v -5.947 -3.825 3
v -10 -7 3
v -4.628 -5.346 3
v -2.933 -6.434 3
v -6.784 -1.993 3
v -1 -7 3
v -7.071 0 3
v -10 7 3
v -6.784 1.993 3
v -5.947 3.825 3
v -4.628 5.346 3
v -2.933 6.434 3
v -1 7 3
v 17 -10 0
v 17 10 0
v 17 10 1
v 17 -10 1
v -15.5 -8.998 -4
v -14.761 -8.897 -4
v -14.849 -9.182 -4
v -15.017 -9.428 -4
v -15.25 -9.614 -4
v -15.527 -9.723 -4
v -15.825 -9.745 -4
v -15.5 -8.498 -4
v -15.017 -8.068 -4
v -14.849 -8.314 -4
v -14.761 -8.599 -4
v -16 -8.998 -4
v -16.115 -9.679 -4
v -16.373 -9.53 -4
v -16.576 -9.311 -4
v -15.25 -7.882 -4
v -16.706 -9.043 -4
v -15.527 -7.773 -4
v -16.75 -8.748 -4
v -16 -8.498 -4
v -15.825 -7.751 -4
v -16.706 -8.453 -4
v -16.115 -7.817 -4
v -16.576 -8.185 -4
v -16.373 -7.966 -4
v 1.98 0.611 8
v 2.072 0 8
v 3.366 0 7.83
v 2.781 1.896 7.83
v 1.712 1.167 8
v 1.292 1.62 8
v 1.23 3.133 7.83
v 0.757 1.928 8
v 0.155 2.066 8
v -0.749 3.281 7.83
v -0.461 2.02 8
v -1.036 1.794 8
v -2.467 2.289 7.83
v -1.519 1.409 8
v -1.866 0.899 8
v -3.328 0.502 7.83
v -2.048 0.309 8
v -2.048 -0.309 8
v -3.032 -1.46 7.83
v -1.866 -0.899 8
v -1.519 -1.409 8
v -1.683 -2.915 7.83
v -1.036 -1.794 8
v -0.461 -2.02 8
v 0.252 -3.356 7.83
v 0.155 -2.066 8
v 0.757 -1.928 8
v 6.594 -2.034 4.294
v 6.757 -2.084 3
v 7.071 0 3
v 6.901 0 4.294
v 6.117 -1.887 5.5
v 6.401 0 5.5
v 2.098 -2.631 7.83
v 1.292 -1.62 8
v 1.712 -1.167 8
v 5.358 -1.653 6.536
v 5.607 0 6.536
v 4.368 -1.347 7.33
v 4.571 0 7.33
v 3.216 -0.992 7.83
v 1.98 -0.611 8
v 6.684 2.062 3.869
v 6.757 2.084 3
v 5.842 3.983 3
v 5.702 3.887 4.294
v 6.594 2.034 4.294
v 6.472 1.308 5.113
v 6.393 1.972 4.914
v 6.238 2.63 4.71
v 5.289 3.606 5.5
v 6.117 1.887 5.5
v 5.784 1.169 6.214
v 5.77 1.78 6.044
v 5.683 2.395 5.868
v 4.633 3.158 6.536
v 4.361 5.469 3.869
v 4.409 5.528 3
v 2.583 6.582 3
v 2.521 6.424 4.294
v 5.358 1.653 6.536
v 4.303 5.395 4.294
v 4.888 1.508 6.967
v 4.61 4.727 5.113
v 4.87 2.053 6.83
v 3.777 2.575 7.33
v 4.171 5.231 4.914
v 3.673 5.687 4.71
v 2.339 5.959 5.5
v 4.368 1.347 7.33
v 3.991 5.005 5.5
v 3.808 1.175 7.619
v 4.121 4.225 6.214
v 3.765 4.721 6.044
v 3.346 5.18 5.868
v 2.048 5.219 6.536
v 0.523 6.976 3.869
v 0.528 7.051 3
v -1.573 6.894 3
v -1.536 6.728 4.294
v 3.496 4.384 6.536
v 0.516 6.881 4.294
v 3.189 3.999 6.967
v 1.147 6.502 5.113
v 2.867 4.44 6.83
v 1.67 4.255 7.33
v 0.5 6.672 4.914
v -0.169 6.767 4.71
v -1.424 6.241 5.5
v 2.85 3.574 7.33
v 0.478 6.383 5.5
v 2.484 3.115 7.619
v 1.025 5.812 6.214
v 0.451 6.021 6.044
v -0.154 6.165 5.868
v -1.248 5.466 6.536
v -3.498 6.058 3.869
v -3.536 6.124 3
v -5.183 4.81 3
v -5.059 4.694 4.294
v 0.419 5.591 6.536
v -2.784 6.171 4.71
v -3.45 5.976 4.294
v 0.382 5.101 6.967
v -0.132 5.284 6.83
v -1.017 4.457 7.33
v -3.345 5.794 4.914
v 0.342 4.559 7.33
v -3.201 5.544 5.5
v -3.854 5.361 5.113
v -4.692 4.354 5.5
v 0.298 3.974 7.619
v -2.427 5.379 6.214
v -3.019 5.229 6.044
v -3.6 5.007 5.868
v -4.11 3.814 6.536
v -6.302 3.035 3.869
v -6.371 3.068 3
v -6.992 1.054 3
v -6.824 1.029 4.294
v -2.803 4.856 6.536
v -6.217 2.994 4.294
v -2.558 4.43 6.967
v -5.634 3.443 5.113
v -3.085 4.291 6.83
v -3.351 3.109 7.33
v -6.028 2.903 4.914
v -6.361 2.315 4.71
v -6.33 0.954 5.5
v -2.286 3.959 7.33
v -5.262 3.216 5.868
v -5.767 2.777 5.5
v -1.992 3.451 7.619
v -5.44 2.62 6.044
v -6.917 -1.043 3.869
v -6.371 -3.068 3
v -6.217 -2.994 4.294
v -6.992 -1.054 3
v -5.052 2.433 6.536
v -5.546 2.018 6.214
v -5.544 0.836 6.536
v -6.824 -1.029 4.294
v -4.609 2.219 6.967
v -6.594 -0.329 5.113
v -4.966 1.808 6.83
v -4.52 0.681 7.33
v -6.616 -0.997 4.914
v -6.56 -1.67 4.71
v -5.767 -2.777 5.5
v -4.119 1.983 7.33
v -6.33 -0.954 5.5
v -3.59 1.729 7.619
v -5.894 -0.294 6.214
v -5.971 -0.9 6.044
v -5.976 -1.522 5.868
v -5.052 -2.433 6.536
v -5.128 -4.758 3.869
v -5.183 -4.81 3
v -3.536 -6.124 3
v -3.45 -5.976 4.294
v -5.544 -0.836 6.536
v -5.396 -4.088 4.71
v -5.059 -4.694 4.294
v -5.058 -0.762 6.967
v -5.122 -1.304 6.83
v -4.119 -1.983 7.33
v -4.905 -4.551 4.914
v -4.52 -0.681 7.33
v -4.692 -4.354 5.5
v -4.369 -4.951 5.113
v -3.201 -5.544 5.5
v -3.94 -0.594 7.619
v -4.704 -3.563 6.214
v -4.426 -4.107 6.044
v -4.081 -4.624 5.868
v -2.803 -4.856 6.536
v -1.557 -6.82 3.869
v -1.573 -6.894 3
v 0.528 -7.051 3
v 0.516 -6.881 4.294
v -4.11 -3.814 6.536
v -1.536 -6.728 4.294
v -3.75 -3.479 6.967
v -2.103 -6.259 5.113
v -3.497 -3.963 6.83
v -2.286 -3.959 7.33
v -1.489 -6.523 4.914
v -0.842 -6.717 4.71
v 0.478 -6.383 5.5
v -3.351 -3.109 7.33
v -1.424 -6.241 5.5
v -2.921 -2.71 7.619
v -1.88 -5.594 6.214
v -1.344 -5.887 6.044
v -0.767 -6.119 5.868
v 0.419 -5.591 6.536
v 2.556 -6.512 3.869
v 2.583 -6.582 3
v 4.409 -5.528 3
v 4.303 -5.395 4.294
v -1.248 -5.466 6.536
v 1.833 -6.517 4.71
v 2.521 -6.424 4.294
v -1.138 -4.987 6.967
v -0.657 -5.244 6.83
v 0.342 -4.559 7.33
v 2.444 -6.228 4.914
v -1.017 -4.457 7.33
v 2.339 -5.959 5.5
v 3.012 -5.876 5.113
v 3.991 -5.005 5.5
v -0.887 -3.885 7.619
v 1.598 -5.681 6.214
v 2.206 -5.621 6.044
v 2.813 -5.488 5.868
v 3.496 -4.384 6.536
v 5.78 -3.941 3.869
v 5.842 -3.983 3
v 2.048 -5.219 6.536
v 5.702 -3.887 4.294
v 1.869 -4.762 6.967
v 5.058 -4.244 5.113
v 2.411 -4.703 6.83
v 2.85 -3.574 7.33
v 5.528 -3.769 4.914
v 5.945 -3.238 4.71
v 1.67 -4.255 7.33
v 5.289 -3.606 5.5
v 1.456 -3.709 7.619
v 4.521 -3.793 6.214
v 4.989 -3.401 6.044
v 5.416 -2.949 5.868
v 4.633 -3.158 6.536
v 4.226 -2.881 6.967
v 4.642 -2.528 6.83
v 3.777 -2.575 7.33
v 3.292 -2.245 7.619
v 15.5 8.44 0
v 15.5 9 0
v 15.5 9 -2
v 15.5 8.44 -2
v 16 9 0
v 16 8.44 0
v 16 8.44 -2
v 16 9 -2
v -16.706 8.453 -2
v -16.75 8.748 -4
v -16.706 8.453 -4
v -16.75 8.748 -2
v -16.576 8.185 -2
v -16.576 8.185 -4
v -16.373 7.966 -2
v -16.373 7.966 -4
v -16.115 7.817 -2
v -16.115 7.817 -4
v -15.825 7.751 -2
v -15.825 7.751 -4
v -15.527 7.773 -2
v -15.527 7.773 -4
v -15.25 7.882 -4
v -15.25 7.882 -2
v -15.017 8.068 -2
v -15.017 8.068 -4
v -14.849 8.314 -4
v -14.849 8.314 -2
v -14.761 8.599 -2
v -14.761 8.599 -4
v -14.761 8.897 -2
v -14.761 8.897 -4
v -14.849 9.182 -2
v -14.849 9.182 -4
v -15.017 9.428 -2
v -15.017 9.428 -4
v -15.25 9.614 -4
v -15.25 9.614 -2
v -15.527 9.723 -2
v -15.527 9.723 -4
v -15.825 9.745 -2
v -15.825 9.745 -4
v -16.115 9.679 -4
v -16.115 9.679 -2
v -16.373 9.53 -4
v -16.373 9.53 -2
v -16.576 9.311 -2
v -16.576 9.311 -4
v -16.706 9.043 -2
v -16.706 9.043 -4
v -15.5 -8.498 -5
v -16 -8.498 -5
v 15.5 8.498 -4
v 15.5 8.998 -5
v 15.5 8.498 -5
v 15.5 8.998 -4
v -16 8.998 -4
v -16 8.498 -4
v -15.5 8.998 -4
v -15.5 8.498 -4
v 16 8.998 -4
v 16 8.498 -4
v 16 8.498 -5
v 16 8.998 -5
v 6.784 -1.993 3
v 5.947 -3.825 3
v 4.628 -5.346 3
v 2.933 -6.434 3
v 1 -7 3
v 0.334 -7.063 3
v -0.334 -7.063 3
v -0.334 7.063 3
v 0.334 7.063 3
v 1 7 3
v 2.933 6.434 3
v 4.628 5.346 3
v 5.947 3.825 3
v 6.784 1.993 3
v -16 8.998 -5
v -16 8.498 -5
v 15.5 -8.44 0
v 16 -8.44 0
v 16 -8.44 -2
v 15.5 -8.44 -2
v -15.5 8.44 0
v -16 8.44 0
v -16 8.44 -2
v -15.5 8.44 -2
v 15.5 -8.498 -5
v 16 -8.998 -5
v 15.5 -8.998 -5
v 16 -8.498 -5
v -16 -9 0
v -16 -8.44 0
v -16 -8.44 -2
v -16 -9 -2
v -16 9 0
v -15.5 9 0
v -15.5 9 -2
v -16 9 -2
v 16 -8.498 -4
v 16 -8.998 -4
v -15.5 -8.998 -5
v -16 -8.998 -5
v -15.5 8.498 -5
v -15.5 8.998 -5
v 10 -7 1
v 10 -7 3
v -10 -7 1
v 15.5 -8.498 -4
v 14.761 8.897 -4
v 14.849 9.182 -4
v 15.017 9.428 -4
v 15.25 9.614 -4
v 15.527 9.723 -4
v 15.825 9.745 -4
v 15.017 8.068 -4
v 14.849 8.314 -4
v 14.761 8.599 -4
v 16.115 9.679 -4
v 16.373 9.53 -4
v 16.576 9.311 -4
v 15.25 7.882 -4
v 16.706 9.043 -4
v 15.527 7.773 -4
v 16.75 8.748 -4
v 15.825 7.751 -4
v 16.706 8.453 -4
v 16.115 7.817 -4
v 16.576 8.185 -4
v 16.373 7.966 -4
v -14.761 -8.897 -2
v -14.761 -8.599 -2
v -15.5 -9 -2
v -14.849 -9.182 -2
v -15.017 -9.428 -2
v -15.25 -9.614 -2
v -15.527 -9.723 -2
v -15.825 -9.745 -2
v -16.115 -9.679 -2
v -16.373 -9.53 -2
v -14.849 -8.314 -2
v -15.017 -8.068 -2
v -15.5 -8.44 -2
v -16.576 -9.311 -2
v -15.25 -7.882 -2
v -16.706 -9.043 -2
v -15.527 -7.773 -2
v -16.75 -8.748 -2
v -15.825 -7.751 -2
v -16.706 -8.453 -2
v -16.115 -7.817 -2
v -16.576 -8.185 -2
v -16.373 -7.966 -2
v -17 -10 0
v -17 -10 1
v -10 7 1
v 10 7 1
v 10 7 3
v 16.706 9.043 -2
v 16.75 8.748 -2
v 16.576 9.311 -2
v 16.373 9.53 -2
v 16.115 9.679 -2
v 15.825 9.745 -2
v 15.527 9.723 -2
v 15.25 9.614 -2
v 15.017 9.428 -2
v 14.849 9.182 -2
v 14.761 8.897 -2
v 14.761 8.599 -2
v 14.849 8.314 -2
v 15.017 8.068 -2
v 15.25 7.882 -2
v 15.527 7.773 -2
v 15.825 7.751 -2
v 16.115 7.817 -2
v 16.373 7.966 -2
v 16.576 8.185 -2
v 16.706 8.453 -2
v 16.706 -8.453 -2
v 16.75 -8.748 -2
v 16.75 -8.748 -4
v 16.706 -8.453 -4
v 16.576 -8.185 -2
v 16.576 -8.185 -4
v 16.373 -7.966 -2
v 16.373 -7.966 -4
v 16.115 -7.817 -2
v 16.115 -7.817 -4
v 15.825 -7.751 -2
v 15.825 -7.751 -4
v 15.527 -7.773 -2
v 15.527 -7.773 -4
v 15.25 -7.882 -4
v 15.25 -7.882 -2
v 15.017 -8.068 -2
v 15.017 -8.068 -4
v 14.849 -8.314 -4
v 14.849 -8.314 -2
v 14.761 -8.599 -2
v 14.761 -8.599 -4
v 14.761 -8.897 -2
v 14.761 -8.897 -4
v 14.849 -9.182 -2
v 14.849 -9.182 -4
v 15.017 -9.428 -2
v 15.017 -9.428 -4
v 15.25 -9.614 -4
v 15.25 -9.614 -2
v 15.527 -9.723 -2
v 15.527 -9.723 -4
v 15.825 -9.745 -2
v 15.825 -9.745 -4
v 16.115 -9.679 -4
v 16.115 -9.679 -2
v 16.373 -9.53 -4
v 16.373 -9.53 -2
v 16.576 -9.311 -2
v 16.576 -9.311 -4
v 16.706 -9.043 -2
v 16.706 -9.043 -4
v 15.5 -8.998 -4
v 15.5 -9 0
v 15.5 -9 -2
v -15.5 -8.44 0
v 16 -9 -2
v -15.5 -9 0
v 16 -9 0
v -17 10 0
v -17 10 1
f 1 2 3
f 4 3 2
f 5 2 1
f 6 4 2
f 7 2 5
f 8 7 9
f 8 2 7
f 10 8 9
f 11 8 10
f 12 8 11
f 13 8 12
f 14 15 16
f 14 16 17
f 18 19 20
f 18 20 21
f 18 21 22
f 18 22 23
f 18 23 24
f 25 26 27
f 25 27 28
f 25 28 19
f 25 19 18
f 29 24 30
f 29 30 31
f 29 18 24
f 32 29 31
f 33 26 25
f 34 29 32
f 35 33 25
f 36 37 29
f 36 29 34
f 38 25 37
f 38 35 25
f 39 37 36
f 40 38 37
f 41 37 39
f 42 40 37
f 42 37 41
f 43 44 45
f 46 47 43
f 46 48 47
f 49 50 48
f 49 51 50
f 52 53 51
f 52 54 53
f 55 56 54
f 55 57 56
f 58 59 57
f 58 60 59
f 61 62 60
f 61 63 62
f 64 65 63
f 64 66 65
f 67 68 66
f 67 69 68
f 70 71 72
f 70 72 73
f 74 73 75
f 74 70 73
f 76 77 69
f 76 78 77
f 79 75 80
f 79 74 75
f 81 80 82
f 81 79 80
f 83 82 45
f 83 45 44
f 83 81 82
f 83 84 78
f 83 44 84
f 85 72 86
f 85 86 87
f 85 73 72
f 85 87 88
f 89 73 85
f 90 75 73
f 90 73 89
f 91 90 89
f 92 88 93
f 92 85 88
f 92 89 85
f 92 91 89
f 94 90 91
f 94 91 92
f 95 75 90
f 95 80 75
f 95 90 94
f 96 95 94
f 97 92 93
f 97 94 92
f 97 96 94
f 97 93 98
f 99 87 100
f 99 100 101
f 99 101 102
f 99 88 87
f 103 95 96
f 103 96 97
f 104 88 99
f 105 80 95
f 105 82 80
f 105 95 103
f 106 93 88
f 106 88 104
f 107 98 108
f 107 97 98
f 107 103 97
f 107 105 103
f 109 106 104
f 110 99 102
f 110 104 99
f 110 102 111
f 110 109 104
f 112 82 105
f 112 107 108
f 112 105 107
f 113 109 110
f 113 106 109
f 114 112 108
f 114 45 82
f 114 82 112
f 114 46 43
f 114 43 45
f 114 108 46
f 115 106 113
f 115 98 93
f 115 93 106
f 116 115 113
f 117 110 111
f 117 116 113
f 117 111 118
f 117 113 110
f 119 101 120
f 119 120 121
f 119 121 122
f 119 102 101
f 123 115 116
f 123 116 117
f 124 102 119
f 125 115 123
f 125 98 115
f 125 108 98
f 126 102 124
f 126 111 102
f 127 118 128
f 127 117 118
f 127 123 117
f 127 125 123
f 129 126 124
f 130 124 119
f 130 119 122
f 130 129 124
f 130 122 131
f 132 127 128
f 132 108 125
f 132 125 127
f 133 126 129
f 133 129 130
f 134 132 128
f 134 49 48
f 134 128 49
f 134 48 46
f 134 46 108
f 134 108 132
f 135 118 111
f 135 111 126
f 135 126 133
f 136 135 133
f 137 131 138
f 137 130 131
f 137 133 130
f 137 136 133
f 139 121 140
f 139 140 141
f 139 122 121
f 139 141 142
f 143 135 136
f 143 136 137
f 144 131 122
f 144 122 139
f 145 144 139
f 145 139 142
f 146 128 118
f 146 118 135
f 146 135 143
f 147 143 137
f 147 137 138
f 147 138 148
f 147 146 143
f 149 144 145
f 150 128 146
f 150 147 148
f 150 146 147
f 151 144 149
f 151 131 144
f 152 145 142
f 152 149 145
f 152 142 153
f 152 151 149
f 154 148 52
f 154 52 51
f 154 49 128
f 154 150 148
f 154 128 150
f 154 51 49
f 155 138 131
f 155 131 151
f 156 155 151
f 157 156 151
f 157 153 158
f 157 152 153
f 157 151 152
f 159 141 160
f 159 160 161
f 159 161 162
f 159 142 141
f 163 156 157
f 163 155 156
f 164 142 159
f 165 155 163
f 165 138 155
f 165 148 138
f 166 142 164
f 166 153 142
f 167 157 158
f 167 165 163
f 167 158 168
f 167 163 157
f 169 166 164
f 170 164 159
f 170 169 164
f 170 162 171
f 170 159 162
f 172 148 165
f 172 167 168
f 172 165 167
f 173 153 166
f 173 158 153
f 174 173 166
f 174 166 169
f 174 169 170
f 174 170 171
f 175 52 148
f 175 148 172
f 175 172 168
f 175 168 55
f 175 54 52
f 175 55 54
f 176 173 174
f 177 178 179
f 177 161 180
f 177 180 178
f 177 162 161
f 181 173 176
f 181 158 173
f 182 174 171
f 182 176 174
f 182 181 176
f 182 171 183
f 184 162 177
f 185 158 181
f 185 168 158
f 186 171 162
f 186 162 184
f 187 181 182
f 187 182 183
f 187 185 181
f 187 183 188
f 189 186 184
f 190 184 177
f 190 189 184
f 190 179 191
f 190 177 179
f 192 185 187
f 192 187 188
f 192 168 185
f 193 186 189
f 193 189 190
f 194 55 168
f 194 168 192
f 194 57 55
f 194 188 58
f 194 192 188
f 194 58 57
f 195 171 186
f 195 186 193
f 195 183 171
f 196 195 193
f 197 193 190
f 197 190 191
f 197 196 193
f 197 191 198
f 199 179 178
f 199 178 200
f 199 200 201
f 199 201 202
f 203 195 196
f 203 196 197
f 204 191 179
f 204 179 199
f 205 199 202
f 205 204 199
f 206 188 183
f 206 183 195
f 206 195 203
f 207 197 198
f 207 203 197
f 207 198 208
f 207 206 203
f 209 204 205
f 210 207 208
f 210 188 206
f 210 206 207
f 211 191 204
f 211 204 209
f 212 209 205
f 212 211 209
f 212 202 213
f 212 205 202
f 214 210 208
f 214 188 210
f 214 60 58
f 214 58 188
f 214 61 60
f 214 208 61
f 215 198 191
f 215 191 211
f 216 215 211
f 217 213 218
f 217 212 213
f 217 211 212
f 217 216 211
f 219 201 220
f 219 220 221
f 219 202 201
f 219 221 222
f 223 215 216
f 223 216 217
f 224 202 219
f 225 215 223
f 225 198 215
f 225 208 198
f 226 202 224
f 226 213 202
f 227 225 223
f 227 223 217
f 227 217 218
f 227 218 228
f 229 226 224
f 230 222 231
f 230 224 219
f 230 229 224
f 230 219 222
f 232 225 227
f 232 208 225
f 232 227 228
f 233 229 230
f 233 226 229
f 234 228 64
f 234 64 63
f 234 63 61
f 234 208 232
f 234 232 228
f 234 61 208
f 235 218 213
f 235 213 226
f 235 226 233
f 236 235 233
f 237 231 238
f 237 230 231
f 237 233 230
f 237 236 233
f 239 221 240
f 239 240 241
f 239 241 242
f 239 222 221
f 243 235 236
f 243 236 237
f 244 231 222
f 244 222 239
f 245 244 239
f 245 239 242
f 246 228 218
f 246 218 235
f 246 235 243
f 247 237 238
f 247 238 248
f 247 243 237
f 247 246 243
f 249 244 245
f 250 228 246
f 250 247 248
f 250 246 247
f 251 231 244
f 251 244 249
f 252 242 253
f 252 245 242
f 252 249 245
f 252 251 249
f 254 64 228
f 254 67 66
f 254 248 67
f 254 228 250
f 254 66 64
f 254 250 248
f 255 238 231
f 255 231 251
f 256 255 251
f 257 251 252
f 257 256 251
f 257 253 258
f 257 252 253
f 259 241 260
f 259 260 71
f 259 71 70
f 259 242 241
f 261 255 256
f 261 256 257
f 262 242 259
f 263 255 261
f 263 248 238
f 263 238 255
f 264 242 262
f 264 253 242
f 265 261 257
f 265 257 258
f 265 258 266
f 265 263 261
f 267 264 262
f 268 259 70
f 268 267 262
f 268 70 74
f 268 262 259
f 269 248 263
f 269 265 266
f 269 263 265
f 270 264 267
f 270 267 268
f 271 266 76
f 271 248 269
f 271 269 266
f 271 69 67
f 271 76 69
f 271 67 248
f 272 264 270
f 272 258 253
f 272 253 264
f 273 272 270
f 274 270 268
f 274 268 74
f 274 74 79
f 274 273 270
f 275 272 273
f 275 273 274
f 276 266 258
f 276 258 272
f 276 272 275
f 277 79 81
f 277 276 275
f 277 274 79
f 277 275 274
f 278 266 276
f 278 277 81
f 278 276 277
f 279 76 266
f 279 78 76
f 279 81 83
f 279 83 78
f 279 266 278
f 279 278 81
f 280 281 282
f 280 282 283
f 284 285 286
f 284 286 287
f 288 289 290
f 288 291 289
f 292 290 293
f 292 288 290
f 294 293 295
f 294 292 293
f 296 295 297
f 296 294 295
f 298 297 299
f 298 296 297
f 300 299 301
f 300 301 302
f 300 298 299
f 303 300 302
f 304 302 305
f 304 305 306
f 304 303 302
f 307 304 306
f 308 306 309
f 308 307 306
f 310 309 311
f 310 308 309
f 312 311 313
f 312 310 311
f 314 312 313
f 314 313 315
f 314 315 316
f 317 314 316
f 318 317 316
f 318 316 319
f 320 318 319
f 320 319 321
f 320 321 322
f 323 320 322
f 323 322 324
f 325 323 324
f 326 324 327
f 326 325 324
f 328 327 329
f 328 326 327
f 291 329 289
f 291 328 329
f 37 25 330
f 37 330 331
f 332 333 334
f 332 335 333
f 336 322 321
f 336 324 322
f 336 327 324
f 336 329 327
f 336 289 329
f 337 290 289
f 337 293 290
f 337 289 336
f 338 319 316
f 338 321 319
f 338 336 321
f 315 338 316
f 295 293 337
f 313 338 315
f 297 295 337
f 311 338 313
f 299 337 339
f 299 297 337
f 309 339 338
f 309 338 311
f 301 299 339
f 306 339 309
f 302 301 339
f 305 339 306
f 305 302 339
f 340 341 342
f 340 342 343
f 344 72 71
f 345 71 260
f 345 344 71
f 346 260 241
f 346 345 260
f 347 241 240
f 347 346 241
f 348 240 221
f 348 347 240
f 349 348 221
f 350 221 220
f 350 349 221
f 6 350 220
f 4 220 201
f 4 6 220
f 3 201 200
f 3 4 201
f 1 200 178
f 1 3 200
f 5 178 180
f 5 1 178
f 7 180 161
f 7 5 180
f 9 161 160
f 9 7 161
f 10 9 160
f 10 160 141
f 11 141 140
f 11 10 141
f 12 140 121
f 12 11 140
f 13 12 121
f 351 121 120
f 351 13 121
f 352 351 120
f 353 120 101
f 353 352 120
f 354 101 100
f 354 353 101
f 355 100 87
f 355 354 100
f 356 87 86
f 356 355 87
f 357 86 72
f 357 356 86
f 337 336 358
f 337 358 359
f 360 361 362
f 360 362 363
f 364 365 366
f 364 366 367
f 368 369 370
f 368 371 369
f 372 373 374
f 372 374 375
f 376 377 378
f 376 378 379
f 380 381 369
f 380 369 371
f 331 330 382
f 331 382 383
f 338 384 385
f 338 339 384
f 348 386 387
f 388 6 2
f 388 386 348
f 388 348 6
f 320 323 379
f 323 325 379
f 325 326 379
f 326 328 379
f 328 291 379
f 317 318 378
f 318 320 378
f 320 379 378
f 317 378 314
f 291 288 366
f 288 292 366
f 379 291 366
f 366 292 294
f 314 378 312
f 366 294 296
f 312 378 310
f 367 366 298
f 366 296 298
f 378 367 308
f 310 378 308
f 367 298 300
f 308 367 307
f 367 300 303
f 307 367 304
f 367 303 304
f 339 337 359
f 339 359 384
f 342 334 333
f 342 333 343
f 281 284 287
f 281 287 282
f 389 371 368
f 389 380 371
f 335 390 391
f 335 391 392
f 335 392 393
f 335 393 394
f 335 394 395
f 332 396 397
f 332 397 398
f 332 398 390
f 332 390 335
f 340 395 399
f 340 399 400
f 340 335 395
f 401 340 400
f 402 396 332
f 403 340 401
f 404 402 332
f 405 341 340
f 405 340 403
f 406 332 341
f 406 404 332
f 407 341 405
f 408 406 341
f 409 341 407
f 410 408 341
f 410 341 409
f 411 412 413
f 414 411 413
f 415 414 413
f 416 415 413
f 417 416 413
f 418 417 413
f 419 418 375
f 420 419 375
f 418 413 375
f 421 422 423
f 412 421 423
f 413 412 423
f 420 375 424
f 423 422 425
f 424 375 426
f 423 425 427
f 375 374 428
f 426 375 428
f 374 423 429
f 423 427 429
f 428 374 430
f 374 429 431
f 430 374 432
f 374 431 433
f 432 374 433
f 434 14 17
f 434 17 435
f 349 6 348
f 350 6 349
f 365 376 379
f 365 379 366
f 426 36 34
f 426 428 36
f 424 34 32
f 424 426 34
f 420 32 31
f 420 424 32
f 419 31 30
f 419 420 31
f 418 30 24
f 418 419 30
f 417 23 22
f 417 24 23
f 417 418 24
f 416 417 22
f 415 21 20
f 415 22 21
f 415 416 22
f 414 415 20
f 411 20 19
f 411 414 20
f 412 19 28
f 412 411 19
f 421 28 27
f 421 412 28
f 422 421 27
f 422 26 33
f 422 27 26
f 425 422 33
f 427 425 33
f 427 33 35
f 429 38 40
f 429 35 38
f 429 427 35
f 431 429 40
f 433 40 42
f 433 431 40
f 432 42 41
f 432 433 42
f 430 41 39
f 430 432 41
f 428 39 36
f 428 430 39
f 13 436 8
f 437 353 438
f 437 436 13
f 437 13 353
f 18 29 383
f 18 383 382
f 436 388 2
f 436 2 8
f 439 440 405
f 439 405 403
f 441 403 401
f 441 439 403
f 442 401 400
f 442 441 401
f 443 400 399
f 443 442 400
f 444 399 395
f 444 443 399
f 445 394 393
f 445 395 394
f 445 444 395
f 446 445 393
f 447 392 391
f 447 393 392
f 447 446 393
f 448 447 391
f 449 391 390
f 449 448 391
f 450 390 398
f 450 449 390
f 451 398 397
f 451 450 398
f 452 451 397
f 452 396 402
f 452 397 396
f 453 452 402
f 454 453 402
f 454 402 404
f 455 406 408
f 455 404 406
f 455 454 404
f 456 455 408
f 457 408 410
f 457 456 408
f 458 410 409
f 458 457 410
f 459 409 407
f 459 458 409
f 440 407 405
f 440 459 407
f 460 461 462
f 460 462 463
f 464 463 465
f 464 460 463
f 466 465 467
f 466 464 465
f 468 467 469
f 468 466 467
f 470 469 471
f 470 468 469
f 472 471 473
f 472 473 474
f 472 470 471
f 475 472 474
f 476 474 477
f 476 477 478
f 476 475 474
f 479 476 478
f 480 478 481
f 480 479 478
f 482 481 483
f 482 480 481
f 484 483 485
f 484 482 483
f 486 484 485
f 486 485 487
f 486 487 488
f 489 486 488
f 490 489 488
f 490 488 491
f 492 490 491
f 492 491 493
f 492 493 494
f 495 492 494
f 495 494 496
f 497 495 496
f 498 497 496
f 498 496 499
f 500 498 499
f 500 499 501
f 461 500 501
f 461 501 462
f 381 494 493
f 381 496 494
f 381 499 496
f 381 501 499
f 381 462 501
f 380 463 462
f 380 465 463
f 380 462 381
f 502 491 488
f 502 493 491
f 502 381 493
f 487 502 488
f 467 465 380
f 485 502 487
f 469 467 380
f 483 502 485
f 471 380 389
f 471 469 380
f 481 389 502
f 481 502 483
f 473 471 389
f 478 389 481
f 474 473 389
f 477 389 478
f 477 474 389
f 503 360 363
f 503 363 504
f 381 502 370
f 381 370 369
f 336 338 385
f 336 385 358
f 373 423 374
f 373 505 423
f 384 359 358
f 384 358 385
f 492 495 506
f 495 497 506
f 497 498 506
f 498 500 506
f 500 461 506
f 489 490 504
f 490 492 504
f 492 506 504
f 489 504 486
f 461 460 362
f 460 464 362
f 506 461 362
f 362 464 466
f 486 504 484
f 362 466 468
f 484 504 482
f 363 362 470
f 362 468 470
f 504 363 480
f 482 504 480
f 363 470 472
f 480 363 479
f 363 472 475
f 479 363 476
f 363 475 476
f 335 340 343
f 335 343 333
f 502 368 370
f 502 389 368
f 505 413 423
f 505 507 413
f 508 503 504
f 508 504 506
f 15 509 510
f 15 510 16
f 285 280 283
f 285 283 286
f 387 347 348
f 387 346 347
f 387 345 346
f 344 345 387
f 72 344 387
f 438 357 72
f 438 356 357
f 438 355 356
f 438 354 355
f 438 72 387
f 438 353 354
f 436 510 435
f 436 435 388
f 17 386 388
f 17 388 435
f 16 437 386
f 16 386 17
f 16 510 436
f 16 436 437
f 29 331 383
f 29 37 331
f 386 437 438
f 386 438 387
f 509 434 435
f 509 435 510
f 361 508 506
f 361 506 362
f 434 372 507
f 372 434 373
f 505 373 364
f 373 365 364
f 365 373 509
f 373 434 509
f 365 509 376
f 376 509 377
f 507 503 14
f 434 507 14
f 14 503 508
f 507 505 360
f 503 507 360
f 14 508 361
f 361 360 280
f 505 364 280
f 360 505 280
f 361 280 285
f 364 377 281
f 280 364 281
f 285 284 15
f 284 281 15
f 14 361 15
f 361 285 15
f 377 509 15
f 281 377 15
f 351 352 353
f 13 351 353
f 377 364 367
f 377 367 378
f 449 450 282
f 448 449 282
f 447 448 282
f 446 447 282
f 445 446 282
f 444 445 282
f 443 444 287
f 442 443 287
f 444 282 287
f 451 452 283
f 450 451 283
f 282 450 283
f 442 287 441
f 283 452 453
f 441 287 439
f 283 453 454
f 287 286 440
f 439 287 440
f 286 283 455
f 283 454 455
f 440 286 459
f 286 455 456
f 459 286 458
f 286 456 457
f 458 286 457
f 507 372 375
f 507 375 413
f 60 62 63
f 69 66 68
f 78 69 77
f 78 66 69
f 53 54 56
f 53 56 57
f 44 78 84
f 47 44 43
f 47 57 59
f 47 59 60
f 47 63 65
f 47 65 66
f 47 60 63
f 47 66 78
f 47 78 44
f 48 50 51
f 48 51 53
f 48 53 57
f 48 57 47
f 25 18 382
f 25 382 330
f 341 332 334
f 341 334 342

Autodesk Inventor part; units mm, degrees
ref_plane "YZ Plane" through (0, 0, 0) normal (1, 0, 0) x (0, 1, 0)
ref_plane "XZ Plane" through (0, 0, 0) normal (0, 1, 0) x (-1, 0, 0)
ref_plane "XY Plane" through (0, 0, 0) normal (0, 0, 1) x (1, 0, 0)
sketch "Sketch1" plane through (0, 0, 0) normal (0, 0, 1) x (1, 0, 0)
  line L0 (17, -10) -> (-17, -10)
  line L1 (-17, -10) -> (-17, 10)
  line L2 (-17, 10) -> (17, 10)
  line L3 (17, 10) -> (17, -10)
  line L4 (17, -10) -> (-17, 10) construction
  line L5 (-17, -10) -> (17, 10) construction
  point P0 (0, 0)
extrude "Extrusion1" add sketch "Sketch1" along normal blind 1
sketch "Sketch2" plane through (0, 0, 1) normal (0, 0, 1) x (1, 0, 0)
  line L0 (10, -7) -> (-10, -7)
  line L1 (-10, -7) -> (-10, 7)
  line L2 (-10, 7) -> (10, 7)
  line L3 (10, 7) -> (10, -7)
  line L4 (10, -7) -> (-10, 7) construction
  line L5 (-10, -7) -> (10, 7) construction
  point P0 (0, 0)
extrude "Extrusion2" add sketch "Sketch2" along normal blind 2
sketch "Sketch3" plane through (0, 0, 3) normal (0, 0, 1) x (1, 0, 0)
  circle A0 centre (0, 0) radius 7.0711
extrude "Extrusion3" add sketch "Sketch3" along normal blind 5
fillet "Fillet1" radius 5 1 edges at (-7.0711, 0, 8)
sketch "Sketch4" plane through (0, 0, 0) normal (0, 0, -1) x (-1, 0, 0)
  line L0 (16, -9) -> (15.5, -9)
  line L1 (15.5, -9) -> (15.5, -8.44)
  line L2 (15.5, -8.44) -> (16, -8.44)
  line L3 (16, -8.44) -> (16, -9)
  point P0 (0, 0)
  dimension "d7" = 0.5
  dimension "d8" = 0.56
extrude "Extrusion4" add sketch "Sketch4" along normal blind 2
mirror "Mirror1" about plane through (0, 0, 0) normal (1, 0, 0) of "Extrusion4"
mirror "Mirror2" about plane through (0, 0, 0) normal (0, 1, 0) of "Extrusion4", "Mirror1"
sketch "Sketch5" plane through (0, 0, -2) normal (0, 0, -1) x (-1, 0, 0)
  circle A0 centre (15.75, -8.7479) radius 1
  point P0 (0, 0)
  dimension "d11" = 2
extrude "Extrusion5" add sketch "Sketch5" along normal blind 2
sketch "Sketch6" plane through (-15.75, -8.7479, -4) normal (0, 0, -1) x (-1, 0, 0)
  line L0 (-0.25, 0.25) -> (0.25, 0.25)
  line L1 (0.25, 0.25) -> (0.25, -0.25)
  line L2 (0.25, -0.25) -> (-0.25, -0.25)
  line L3 (-0.25, -0.25) -> (-0.25, 0.25)
  line L4 (-0.25, 0.25) -> (0.25, -0.25) construction
  line L5 (0.25, 0.25) -> (-0.25, -0.25) construction
  point P0 (-15.75, 8.7479)
  point P1 (0, 0)
  dimension "d14" = 0.5
  dimension "d15" = 0.5
extrude "Extrusion6" add sketch "Sketch6" along normal blind 1
mirror "Mirror3" about plane through (0, 0, 0) normal (1, 0, 0) of "Extrusion6"
mirror "Mirror4" about plane through (0, 0, 0) normal (1, 0, 0) of "Extrusion6", "Extrusion5"
mirror "Mirror5" about plane through (0, 0, 0) normal (0, 1, 0) of "Extrusion5", "Extrusion6", "Mirror4"
sketch "Sketch7" plane through (0, 0, 1) normal (0, 0, 1) x (1, 0, 0)
  point P0 (0, 0)
ref_plane "Work Plane1" through (0, 0, 0) normal (0, 1, 0) x (-1, 0, 0)
properties part number "pir sensor"
